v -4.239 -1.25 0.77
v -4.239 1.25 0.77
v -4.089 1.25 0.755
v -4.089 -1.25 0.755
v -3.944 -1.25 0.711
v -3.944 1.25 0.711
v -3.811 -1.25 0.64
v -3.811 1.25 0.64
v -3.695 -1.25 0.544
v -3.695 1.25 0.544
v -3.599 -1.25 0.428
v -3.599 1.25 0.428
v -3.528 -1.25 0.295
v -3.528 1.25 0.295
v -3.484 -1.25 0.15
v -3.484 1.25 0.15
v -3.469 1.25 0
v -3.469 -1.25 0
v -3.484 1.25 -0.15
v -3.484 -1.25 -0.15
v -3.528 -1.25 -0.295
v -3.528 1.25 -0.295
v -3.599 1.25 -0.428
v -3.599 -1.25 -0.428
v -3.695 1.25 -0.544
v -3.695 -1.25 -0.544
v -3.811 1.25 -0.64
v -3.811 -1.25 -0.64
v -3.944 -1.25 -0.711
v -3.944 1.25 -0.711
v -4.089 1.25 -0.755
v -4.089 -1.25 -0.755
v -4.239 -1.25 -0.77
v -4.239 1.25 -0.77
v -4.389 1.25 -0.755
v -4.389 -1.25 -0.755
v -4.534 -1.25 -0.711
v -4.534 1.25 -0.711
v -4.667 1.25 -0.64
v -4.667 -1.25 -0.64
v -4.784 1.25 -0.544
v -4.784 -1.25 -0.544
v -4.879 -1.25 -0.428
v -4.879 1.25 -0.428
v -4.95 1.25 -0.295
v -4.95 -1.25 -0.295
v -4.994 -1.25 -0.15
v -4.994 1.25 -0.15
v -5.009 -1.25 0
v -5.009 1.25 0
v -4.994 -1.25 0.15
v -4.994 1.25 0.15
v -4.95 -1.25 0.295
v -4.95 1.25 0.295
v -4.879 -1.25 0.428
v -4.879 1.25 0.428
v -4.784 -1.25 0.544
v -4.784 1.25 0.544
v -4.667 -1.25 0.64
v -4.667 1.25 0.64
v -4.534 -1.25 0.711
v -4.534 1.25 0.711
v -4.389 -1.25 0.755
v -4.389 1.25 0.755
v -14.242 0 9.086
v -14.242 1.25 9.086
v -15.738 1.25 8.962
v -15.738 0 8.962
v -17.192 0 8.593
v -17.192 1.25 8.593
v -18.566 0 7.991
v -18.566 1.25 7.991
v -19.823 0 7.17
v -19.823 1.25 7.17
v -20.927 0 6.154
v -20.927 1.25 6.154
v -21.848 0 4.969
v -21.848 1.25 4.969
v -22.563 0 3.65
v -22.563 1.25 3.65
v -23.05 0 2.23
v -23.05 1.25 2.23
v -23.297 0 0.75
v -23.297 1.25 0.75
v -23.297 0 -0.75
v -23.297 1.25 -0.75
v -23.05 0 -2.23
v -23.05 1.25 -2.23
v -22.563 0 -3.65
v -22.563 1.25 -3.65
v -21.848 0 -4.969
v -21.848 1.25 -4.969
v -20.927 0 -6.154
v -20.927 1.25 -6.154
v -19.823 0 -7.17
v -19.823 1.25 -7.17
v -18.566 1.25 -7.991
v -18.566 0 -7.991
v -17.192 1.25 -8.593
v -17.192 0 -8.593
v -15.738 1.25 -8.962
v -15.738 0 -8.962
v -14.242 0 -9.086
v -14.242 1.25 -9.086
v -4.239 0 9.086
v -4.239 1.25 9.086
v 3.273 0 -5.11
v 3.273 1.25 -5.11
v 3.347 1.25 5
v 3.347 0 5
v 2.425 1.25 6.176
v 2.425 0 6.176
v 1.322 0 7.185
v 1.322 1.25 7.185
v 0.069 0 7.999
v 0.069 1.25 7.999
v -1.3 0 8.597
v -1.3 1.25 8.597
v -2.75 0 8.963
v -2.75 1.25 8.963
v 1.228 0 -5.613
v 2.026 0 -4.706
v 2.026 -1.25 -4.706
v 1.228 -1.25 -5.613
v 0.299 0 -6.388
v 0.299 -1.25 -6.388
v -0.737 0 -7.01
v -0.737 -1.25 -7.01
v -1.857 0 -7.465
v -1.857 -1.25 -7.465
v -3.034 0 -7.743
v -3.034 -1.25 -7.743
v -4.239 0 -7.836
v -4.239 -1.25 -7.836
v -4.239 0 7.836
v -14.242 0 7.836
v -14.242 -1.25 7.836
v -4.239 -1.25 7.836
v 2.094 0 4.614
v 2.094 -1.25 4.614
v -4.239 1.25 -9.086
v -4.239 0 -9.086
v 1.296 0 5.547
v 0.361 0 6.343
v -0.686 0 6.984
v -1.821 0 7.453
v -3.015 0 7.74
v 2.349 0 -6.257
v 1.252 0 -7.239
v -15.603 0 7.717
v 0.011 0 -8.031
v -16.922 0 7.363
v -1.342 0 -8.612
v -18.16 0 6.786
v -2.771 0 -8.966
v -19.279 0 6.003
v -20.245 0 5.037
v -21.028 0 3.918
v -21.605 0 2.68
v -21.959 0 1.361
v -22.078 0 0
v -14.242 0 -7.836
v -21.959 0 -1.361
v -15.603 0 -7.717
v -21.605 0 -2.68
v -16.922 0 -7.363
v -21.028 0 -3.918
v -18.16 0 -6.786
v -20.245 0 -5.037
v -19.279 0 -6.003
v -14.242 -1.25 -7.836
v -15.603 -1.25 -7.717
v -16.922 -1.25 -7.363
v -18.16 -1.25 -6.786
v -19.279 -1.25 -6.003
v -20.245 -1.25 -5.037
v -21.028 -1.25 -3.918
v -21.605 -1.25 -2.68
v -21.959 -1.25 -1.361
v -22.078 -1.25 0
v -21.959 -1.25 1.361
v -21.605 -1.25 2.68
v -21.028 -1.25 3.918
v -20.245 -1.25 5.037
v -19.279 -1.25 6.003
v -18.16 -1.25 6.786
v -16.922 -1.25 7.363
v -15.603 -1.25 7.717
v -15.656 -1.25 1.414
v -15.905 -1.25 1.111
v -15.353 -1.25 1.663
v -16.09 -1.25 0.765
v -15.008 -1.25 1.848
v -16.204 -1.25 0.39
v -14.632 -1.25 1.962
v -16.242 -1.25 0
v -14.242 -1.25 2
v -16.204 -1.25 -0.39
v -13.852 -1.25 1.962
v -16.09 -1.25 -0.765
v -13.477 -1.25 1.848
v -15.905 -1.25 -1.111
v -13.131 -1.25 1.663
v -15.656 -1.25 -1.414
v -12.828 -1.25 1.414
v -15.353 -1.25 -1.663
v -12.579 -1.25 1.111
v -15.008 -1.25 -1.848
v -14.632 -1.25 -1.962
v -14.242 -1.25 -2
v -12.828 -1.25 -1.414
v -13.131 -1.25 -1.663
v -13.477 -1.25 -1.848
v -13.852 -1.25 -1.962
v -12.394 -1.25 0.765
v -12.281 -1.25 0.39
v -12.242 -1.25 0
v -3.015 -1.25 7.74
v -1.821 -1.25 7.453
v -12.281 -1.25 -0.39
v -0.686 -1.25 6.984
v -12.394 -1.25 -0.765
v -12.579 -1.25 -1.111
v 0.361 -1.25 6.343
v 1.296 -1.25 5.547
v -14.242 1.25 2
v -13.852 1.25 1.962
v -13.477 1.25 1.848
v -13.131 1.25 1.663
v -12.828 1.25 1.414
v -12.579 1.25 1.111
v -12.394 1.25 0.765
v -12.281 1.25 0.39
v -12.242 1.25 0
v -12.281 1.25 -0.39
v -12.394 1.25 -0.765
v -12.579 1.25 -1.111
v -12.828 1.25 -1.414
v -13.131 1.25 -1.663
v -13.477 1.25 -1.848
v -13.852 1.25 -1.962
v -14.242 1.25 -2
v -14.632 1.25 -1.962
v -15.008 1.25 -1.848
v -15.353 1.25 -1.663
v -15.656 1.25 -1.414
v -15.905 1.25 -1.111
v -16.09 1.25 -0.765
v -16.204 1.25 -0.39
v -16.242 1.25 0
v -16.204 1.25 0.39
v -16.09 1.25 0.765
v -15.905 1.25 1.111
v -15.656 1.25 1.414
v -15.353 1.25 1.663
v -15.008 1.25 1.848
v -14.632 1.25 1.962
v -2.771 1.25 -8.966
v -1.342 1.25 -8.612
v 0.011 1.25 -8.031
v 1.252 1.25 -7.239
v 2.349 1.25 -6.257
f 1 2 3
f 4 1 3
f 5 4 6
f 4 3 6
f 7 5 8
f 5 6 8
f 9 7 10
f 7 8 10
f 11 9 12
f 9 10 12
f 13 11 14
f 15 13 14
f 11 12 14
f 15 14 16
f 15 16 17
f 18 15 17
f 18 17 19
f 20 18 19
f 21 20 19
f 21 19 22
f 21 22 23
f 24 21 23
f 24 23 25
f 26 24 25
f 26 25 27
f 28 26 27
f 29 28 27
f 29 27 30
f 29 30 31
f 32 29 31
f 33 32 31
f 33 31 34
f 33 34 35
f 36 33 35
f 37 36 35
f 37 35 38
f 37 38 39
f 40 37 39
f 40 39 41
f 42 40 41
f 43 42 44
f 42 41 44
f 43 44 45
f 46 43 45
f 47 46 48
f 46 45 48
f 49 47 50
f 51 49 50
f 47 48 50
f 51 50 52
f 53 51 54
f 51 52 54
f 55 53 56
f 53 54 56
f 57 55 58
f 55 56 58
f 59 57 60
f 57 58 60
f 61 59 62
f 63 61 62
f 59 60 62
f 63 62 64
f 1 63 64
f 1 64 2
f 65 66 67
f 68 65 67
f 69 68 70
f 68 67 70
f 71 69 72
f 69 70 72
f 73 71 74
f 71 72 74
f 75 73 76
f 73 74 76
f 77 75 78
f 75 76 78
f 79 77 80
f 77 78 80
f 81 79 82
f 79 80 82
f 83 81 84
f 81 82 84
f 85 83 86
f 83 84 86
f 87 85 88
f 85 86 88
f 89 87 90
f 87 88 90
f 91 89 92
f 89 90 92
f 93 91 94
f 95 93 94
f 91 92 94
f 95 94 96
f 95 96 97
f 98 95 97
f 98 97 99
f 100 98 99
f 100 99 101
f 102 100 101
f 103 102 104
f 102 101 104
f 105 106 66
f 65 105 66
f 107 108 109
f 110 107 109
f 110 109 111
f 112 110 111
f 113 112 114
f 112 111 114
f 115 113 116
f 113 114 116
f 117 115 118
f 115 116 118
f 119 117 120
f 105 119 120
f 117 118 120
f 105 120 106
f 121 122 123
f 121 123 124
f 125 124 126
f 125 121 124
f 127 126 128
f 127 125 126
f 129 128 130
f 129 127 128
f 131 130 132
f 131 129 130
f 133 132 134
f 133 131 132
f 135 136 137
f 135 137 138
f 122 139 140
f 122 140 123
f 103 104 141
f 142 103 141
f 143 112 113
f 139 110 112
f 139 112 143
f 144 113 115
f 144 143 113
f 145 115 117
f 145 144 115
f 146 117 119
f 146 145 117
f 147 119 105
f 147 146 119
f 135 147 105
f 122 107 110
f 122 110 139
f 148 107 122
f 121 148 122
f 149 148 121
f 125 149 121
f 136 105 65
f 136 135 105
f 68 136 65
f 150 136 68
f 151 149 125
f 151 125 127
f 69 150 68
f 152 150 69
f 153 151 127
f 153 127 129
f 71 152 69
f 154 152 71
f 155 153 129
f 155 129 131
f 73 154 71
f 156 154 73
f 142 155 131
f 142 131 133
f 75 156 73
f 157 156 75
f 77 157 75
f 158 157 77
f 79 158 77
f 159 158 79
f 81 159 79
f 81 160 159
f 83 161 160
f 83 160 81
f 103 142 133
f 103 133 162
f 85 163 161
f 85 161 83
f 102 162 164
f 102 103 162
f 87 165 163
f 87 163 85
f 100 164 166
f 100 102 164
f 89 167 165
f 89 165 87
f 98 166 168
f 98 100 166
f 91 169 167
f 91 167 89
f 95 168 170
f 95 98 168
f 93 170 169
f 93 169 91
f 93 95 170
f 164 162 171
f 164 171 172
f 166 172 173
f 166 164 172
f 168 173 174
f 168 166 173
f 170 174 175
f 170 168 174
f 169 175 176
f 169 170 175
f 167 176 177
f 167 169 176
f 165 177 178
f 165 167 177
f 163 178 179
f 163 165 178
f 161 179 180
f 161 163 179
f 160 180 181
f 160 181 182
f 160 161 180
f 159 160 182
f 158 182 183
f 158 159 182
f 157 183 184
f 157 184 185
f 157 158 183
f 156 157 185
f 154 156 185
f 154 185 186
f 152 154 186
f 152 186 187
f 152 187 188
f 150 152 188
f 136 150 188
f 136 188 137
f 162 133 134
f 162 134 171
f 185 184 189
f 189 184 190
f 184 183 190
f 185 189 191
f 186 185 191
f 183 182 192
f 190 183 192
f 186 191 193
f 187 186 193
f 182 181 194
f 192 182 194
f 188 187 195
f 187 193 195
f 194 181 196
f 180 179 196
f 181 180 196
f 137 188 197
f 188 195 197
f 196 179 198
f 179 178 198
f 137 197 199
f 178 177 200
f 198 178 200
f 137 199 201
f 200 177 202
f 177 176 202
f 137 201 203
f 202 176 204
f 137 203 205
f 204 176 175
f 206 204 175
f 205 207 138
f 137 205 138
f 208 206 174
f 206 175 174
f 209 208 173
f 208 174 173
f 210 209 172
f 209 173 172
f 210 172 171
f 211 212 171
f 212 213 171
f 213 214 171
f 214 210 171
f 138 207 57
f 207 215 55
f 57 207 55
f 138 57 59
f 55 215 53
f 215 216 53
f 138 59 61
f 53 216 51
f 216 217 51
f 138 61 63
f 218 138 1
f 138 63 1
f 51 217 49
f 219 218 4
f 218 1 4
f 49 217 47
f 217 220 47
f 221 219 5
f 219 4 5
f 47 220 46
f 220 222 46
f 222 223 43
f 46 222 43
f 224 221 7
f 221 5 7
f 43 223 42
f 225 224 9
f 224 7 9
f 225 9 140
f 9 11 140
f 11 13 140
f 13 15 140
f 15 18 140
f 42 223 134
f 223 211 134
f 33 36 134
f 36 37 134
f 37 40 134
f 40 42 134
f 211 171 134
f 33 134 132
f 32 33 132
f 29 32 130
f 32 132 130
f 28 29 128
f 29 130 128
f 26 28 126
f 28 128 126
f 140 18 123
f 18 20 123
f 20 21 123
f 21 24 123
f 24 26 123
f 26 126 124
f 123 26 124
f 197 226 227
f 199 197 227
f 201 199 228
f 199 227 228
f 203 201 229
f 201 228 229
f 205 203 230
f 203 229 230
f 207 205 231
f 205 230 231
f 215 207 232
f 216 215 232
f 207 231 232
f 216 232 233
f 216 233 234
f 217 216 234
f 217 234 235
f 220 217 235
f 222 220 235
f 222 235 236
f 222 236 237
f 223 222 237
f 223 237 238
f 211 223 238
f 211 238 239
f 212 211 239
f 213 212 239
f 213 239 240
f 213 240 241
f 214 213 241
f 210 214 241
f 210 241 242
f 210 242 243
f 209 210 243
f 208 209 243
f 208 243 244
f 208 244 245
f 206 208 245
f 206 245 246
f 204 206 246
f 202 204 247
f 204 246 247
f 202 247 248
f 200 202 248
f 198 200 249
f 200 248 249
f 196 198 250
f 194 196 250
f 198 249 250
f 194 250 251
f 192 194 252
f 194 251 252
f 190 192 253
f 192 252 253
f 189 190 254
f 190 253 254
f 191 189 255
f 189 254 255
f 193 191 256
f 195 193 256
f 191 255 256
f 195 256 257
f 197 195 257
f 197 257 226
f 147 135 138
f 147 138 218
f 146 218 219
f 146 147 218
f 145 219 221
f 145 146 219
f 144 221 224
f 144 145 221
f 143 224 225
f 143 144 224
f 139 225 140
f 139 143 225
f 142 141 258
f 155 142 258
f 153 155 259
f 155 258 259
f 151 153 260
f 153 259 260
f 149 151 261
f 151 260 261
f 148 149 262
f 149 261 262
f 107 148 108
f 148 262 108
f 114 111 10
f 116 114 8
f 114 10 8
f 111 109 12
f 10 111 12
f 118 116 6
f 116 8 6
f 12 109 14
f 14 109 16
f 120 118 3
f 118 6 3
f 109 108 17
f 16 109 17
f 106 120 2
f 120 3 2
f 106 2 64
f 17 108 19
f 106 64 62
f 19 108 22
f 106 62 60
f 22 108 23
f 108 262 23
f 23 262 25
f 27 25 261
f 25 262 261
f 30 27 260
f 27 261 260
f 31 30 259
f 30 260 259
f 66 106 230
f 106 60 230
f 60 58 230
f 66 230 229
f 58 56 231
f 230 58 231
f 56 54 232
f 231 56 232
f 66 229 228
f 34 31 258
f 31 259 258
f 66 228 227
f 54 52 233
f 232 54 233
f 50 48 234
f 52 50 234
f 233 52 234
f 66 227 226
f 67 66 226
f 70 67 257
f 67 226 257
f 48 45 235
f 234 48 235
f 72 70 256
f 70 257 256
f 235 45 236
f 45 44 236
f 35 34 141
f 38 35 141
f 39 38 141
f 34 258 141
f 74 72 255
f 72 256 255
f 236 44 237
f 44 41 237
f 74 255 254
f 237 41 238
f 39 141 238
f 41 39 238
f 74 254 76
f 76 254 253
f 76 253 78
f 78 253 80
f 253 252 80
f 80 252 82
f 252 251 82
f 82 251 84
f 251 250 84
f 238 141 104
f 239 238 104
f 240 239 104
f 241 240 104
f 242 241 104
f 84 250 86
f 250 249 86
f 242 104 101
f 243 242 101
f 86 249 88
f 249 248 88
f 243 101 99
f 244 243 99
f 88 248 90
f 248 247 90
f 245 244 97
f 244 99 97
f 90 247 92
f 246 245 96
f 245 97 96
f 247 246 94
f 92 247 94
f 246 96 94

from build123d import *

# Parameters (mm, degrees)
SKETCH1_R           = 0.77
SKETCH1_R_2         = 2
BOSS_EXTRUDE2_DEPTH = 1.25
BOSS_EXTRUDE3_START = 1.25
SKETCH1_5_R         = 0.77
SKETCH1_5_R_2       = 2
BOSS_EXTRUDE3_DEPTH = 1.25


with BuildPart() as part:
    # Sketch1 → Boss-Extrude2 (new body)
    with BuildSketch(Plane(origin=(0, 0, 0), x_dir=(1, 0, 0), z_dir=(0, 1, 0))):
        with BuildLine():
            Line((-14.242139595, -7.835793251), (-4.23908362, -7.835793251))
            ThreePointArc((-4.23908362, -7.835793251), (-0.686146993, -6.984002949), (2.094345322, -4.613819859))
            Line((2.094345322, -4.613819859), (2.026352853, 4.705737102))
            ThreePointArc((2.026352853, 4.705737102), (-0.737193213, 7.009737473), (-4.23908362, 7.835793251))
            Line((-4.23908362, 7.835793251), (-14.242139595, 7.835793251))
            ThreePointArc((-14.242139595, 7.835793251), (-22.077932846, 0), (-14.242139595, -7.835793251))
        make_face()
        with Locations((-4.23908362, 0)):
            Circle(SKETCH1_R, mode=Mode.SUBTRACT)
        with Locations((-14.242139595, 0)):
            Circle(SKETCH1_R_2, mode=Mode.SUBTRACT)
    extrude(amount=-BOSS_EXTRUDE2_DEPTH)

    # Sketch1<5> → Boss-Extrude3 (add)
    with BuildSketch(Plane(origin=(0, 0, 0), x_dir=(1, 0, 0), z_dir=(0, 1, 0)).offset(BOSS_EXTRUDE3_START)):
        with BuildLine():
            Line((3.27343561, 5.110155948), (3.347196034, -5))
            ThreePointArc((3.347196034, -5), (0.069203321, -7.999393891), (-4.23908362, -9.085793251))
            Line((-4.23908362, -9.085793251), (-14.242139595, -9.085793251))
            ThreePointArc((-14.242139595, -9.085793251), (-23.327932846, 0), (-14.242139595, 9.085793251))
            Line((-14.242139595, 9.085793251), (-4.23908362, 9.085793251))
            ThreePointArc((-4.23908362, 9.085793251), (0.010729233, 8.030612038), (3.27343561, 5.110155948))
        make_face()
        with Locations((-4.23908362, 0)):
            Circle(SKETCH1_5_R, mode=Mode.SUBTRACT)
        with Locations((-14.242139595, 0)):
            Circle(SKETCH1_5_R_2, mode=Mode.SUBTRACT)
    extrude(amount=-BOSS_EXTRUDE3_DEPTH)


solid = part.part
